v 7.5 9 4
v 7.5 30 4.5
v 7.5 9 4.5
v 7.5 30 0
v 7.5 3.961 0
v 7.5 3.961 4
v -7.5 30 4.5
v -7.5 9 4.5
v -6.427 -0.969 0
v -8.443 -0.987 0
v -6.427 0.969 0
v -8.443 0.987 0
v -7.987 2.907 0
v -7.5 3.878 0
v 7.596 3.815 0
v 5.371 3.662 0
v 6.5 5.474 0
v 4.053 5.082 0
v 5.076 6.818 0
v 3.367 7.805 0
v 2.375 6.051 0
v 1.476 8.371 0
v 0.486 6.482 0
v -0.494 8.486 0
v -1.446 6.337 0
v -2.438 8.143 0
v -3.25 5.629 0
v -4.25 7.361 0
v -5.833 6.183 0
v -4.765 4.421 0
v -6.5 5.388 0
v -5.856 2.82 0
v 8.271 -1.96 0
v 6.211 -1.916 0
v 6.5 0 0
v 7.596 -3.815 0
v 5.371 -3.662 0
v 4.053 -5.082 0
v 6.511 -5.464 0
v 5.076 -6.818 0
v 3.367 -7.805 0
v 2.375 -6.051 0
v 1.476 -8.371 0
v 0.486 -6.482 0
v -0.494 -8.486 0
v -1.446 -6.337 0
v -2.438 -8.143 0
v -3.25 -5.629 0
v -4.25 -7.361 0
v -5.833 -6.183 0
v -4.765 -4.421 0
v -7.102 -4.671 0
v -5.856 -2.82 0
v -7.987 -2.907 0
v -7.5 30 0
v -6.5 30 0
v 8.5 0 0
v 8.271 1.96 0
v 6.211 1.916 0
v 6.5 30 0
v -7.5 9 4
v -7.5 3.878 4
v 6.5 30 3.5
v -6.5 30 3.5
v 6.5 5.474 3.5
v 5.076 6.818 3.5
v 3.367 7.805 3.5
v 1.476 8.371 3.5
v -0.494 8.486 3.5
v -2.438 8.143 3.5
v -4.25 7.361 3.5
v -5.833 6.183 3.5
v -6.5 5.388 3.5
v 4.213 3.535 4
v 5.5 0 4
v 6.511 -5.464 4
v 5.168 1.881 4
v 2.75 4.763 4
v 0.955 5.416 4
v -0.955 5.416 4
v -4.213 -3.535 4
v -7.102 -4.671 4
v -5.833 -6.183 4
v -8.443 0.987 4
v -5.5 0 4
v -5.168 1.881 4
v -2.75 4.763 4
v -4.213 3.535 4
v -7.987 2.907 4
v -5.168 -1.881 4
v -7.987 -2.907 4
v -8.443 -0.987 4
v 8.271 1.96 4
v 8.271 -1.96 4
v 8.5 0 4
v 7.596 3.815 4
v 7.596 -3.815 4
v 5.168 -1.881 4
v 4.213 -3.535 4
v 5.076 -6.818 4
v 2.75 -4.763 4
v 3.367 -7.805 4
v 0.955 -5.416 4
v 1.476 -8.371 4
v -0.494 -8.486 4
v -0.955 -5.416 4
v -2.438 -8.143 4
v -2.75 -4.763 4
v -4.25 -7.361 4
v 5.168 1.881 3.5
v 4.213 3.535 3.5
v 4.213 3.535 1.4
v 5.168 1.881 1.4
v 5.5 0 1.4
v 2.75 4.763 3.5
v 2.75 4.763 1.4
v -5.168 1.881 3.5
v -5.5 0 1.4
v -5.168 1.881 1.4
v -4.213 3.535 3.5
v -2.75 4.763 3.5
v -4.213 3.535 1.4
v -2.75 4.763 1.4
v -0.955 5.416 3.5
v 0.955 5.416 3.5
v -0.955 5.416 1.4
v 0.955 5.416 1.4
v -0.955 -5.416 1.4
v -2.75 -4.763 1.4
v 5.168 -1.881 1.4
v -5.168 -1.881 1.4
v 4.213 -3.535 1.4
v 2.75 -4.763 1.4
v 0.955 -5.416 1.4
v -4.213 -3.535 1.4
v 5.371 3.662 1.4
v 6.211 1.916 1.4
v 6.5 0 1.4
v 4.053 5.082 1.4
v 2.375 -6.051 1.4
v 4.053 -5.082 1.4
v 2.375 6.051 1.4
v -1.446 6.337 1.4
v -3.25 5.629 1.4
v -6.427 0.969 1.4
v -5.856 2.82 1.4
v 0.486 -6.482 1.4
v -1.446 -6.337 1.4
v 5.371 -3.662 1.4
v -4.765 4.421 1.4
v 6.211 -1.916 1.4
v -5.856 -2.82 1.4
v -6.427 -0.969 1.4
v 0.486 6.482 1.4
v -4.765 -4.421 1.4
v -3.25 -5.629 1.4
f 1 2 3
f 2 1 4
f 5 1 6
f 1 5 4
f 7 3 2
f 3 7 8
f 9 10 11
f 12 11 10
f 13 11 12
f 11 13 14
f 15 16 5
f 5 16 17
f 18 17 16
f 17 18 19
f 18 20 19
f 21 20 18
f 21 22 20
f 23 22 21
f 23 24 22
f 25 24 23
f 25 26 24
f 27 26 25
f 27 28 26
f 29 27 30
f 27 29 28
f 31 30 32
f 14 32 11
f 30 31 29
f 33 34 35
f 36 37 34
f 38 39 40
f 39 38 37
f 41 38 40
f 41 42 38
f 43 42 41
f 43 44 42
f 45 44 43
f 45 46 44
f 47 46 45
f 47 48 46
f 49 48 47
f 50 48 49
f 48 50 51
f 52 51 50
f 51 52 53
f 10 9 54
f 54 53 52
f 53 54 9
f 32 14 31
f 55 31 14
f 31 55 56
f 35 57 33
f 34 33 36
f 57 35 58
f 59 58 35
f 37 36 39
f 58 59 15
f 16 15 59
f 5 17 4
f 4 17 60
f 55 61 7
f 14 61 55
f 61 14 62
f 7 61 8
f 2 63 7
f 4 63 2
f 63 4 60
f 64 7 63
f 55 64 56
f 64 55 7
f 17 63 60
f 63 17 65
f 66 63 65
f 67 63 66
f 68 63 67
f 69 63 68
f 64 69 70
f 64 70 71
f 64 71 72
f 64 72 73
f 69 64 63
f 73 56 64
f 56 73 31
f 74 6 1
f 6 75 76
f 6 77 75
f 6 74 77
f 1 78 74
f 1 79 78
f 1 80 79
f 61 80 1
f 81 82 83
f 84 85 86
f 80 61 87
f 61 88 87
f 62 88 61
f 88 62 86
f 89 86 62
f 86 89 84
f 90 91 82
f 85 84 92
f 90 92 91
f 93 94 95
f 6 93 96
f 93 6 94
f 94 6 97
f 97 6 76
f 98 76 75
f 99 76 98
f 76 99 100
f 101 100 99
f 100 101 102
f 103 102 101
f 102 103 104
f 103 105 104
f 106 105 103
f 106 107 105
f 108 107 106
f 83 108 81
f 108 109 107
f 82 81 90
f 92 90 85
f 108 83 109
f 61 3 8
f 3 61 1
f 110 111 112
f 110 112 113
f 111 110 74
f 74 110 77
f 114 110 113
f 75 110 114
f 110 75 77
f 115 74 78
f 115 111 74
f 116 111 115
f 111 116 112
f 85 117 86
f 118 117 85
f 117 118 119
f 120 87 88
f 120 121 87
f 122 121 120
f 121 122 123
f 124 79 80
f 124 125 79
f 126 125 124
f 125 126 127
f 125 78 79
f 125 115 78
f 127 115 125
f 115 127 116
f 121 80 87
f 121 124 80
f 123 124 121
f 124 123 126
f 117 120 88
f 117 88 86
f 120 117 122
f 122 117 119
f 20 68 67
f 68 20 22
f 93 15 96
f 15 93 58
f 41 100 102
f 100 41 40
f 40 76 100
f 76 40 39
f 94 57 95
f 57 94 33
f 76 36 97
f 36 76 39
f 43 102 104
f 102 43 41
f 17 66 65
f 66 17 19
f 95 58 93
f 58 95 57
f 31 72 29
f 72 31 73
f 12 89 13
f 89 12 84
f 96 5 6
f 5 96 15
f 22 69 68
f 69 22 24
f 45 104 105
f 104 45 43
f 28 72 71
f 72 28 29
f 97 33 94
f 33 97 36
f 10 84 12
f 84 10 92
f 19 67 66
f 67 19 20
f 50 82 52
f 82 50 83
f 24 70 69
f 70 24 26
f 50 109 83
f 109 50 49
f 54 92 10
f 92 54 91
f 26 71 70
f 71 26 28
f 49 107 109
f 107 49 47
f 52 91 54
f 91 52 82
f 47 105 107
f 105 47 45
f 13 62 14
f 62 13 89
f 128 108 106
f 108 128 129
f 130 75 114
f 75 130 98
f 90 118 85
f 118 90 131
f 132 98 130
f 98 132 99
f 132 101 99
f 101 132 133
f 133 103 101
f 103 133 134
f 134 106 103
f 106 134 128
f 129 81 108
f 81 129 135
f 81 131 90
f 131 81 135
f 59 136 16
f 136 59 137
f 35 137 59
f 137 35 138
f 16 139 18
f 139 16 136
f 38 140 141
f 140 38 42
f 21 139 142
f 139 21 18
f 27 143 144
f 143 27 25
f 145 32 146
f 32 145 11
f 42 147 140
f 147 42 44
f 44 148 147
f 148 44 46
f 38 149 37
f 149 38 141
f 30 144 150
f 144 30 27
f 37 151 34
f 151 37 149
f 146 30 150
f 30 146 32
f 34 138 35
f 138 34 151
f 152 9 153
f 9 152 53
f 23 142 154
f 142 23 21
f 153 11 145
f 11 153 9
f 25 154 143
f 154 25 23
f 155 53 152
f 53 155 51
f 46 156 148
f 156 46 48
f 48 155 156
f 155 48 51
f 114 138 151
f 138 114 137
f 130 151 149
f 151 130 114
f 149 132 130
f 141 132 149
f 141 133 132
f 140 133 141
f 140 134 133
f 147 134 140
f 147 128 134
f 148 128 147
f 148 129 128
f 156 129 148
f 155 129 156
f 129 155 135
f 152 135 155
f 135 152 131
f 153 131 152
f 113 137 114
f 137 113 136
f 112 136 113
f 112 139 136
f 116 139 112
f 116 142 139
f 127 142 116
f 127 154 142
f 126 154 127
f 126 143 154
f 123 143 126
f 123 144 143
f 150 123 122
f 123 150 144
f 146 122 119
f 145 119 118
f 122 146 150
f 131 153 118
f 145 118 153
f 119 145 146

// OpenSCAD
movement_ruler_width = 15;
movement_ruler_length = 30;

movement_ruler_height = 4.5;
movement_ruler_pocket_depth = 3.5;

pivot_outer_rad = 8.5;
pivot_inner_rad = 11/2;
pivot_second_inner_rad = 13/2;

ruler_ridge_length = 2;

bottom_ruler_indent = 0.5;

pivot_second_inner__bottom_offset = 1.5;

//bottom ruler piece
difference(){
    translate([-movement_ruler_width/2,0,0]){
    difference(){
        cube([ movement_ruler_width, movement_ruler_length, movement_ruler_height]);
        //Bottom large indent
        translate([1,-.01,-1])cube([movement_ruler_width-ruler_ridge_length, movement_ruler_length+0.2, movement_ruler_pocket_depth+1]);
        //top shallow indent for pivot piece
        translate([-1,-7,movement_ruler_height-bottom_ruler_indent])cube([movement_ruler_width+2, movement_ruler_length-14, bottom_ruler_indent+0.1]);
        
        }   //translate([-1,0,movement_ruler_height-bottom_ruler_indent+0.1])cube([movement_ruler_width+2, movement_ruler_length+0.2, bottom_ruler_indent]);
    }
    //larger inner circle which punches through the top
    translate([0,0,-0.1])cylinder(h=movement_ruler_height,r=pivot_inner_rad);
}
difference(){
    cylinder(h=movement_ruler_height,r=pivot_outer_rad);
    //larger inner circle which punches through the top
    translate([0,0,-0.1])cylinder(h=movement_ruler_height,r=pivot_inner_rad);
    //smaller inner circle
    translate([0,0,-0.1])cylinder(h=pivot_second_inner__bottom_offset,r=pivot_second_inner_rad);
    
    //top shallow indent for pivot piece
    translate([0,0,movement_ruler_height-bottom_ruler_indent])cylinder(h=bottom_ruler_indent+0.1,r=pivot_outer_rad+0.1);
}
